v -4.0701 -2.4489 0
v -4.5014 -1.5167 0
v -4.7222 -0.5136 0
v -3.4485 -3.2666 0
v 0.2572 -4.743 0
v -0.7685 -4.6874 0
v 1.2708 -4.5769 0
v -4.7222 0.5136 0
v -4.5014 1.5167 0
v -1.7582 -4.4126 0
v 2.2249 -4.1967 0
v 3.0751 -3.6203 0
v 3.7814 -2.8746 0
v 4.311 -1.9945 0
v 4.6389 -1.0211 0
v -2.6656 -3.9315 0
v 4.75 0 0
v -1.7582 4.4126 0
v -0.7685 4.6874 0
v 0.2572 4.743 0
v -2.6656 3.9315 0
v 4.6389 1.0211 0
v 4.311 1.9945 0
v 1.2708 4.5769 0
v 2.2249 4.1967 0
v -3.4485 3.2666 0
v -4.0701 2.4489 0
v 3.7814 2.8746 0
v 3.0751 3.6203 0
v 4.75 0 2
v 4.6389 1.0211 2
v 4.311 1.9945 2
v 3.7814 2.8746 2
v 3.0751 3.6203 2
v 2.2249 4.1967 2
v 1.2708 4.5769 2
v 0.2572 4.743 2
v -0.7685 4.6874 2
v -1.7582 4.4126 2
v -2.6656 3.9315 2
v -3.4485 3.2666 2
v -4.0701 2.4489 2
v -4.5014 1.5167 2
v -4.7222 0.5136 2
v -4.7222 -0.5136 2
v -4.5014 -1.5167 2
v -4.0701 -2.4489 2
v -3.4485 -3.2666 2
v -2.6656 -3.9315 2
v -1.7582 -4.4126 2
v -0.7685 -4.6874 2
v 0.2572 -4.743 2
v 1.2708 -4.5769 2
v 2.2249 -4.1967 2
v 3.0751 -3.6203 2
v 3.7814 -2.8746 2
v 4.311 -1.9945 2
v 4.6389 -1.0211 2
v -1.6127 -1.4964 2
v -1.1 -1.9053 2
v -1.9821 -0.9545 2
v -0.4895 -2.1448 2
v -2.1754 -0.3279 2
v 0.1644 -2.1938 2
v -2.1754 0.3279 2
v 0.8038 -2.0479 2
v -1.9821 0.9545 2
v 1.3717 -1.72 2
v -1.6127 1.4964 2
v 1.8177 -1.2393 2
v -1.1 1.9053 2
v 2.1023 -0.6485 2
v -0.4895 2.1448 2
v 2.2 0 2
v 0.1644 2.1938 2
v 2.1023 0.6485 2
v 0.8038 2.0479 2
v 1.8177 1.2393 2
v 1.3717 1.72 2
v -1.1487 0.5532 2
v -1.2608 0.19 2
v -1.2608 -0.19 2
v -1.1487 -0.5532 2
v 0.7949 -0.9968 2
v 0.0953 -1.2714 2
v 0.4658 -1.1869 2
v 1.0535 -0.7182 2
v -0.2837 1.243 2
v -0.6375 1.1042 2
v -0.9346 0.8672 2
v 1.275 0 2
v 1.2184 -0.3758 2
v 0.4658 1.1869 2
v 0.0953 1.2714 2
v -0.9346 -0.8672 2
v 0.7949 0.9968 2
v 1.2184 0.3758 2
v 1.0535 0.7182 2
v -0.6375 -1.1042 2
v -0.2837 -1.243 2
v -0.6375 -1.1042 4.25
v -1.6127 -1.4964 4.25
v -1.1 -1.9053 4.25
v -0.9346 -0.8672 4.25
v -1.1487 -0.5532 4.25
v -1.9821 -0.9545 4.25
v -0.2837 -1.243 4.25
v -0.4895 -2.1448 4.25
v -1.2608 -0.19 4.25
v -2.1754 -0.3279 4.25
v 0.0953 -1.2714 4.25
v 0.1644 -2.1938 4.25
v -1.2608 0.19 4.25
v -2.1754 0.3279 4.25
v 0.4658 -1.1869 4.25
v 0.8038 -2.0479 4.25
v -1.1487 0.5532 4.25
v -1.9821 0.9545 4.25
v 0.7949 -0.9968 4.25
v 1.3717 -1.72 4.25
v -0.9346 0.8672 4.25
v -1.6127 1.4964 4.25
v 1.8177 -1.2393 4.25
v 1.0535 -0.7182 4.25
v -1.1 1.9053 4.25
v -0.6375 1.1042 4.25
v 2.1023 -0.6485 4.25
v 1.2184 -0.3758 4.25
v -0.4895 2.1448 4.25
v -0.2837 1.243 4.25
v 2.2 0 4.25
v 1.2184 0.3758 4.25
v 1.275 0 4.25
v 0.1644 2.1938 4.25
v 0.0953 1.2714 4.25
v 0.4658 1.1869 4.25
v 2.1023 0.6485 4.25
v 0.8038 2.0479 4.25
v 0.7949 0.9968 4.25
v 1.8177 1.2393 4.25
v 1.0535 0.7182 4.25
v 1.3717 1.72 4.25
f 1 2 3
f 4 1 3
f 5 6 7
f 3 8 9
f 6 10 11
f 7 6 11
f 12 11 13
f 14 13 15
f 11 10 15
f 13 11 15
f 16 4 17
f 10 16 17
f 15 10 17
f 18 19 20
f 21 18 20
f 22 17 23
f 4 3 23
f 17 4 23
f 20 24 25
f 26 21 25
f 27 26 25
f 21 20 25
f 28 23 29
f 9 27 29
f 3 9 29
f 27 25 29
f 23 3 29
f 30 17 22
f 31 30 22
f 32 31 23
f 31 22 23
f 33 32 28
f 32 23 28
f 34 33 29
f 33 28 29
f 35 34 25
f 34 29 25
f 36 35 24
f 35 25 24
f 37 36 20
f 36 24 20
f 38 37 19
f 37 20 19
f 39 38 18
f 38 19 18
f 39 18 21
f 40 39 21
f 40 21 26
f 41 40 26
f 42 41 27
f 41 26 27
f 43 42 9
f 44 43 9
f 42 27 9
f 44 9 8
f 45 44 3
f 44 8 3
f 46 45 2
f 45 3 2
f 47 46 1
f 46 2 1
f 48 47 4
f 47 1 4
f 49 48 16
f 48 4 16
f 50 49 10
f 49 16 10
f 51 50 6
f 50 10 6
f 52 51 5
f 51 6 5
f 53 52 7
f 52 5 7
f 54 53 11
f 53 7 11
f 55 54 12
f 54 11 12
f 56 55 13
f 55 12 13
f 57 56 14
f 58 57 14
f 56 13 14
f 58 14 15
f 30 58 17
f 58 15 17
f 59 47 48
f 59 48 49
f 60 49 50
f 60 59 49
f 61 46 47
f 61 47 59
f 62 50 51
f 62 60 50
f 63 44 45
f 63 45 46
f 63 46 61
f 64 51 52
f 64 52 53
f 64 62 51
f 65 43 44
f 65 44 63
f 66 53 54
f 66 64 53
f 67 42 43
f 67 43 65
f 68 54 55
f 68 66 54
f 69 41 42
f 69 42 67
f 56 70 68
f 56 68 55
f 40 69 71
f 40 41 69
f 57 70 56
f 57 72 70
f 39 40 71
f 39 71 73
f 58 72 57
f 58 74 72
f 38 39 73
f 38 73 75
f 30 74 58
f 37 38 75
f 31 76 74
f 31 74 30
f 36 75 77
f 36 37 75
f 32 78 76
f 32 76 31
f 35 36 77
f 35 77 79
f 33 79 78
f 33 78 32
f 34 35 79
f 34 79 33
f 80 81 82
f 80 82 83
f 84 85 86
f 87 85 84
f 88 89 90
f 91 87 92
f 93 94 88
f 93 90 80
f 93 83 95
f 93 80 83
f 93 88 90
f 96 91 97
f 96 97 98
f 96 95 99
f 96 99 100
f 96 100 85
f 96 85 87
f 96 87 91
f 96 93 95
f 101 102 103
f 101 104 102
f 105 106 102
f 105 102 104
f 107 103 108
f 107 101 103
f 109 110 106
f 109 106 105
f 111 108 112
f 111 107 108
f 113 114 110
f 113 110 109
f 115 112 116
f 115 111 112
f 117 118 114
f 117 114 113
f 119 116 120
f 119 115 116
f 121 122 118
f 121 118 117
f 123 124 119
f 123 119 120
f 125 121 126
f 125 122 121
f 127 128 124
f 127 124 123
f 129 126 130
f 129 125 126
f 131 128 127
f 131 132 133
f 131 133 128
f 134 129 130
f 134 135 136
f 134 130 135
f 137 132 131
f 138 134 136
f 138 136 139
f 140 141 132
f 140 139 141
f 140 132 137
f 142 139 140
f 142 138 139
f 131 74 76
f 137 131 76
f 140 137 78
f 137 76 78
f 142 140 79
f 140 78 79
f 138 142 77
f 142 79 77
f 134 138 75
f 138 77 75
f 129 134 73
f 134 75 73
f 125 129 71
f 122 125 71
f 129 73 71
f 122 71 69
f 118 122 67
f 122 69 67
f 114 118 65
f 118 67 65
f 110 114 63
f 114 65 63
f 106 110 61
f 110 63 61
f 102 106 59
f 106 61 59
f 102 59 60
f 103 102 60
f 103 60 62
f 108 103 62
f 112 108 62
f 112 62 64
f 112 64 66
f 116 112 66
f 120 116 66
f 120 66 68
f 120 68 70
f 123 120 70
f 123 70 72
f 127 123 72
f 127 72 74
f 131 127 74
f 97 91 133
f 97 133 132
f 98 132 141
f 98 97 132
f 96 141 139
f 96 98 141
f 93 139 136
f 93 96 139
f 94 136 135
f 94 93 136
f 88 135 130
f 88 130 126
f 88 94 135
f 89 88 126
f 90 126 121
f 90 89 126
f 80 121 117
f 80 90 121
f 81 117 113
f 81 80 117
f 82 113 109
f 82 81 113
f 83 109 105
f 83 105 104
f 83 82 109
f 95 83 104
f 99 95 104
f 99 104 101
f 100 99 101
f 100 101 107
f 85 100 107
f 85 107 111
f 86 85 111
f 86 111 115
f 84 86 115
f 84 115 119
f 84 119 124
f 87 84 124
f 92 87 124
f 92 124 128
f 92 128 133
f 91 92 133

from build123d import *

# Parameters (mm, degrees)
SKETCH1_R             = 4.75
SKETCH1_R_2           = 2.2
BOSS_EXTRUDE1_DEPTH   = 2
SKETCH1_R_3           = 1.275
BOSS_EXTRUDE1_2_DEPTH = 2
SKETCH1_3_R           = 2.2
SKETCH1_3_R_2         = 1.275
BOSS_EXTRUDE2_DEPTH   = 4.25


with BuildPart() as part:
    # Sketch1 → Boss-Extrude1 (new body)
    with BuildSketch(Plane.XY):
        Circle(SKETCH1_R)
        Circle(SKETCH1_R_2, mode=Mode.SUBTRACT)
    extrude(amount=BOSS_EXTRUDE1_DEPTH)



with BuildPart() as body_2:
    # Sketch1 → Boss-Extrude1 2 (new body)
    with BuildSketch(Plane.XY):
        Circle(SKETCH1_R_3)
    extrude(amount=BOSS_EXTRUDE1_2_DEPTH)


with BuildPart() as part_1:
    add(part.part)

    add(body_2.part)  # Boss-Extrude2 merges body 2
    # Sketch1<3> → Boss-Extrude2 (add)
    with BuildSketch(Plane.XY):
        Circle(SKETCH1_3_R)
        Circle(SKETCH1_3_R_2, mode=Mode.SUBTRACT)
    extrude(amount=BOSS_EXTRUDE2_DEPTH)


solid = part_1.part
